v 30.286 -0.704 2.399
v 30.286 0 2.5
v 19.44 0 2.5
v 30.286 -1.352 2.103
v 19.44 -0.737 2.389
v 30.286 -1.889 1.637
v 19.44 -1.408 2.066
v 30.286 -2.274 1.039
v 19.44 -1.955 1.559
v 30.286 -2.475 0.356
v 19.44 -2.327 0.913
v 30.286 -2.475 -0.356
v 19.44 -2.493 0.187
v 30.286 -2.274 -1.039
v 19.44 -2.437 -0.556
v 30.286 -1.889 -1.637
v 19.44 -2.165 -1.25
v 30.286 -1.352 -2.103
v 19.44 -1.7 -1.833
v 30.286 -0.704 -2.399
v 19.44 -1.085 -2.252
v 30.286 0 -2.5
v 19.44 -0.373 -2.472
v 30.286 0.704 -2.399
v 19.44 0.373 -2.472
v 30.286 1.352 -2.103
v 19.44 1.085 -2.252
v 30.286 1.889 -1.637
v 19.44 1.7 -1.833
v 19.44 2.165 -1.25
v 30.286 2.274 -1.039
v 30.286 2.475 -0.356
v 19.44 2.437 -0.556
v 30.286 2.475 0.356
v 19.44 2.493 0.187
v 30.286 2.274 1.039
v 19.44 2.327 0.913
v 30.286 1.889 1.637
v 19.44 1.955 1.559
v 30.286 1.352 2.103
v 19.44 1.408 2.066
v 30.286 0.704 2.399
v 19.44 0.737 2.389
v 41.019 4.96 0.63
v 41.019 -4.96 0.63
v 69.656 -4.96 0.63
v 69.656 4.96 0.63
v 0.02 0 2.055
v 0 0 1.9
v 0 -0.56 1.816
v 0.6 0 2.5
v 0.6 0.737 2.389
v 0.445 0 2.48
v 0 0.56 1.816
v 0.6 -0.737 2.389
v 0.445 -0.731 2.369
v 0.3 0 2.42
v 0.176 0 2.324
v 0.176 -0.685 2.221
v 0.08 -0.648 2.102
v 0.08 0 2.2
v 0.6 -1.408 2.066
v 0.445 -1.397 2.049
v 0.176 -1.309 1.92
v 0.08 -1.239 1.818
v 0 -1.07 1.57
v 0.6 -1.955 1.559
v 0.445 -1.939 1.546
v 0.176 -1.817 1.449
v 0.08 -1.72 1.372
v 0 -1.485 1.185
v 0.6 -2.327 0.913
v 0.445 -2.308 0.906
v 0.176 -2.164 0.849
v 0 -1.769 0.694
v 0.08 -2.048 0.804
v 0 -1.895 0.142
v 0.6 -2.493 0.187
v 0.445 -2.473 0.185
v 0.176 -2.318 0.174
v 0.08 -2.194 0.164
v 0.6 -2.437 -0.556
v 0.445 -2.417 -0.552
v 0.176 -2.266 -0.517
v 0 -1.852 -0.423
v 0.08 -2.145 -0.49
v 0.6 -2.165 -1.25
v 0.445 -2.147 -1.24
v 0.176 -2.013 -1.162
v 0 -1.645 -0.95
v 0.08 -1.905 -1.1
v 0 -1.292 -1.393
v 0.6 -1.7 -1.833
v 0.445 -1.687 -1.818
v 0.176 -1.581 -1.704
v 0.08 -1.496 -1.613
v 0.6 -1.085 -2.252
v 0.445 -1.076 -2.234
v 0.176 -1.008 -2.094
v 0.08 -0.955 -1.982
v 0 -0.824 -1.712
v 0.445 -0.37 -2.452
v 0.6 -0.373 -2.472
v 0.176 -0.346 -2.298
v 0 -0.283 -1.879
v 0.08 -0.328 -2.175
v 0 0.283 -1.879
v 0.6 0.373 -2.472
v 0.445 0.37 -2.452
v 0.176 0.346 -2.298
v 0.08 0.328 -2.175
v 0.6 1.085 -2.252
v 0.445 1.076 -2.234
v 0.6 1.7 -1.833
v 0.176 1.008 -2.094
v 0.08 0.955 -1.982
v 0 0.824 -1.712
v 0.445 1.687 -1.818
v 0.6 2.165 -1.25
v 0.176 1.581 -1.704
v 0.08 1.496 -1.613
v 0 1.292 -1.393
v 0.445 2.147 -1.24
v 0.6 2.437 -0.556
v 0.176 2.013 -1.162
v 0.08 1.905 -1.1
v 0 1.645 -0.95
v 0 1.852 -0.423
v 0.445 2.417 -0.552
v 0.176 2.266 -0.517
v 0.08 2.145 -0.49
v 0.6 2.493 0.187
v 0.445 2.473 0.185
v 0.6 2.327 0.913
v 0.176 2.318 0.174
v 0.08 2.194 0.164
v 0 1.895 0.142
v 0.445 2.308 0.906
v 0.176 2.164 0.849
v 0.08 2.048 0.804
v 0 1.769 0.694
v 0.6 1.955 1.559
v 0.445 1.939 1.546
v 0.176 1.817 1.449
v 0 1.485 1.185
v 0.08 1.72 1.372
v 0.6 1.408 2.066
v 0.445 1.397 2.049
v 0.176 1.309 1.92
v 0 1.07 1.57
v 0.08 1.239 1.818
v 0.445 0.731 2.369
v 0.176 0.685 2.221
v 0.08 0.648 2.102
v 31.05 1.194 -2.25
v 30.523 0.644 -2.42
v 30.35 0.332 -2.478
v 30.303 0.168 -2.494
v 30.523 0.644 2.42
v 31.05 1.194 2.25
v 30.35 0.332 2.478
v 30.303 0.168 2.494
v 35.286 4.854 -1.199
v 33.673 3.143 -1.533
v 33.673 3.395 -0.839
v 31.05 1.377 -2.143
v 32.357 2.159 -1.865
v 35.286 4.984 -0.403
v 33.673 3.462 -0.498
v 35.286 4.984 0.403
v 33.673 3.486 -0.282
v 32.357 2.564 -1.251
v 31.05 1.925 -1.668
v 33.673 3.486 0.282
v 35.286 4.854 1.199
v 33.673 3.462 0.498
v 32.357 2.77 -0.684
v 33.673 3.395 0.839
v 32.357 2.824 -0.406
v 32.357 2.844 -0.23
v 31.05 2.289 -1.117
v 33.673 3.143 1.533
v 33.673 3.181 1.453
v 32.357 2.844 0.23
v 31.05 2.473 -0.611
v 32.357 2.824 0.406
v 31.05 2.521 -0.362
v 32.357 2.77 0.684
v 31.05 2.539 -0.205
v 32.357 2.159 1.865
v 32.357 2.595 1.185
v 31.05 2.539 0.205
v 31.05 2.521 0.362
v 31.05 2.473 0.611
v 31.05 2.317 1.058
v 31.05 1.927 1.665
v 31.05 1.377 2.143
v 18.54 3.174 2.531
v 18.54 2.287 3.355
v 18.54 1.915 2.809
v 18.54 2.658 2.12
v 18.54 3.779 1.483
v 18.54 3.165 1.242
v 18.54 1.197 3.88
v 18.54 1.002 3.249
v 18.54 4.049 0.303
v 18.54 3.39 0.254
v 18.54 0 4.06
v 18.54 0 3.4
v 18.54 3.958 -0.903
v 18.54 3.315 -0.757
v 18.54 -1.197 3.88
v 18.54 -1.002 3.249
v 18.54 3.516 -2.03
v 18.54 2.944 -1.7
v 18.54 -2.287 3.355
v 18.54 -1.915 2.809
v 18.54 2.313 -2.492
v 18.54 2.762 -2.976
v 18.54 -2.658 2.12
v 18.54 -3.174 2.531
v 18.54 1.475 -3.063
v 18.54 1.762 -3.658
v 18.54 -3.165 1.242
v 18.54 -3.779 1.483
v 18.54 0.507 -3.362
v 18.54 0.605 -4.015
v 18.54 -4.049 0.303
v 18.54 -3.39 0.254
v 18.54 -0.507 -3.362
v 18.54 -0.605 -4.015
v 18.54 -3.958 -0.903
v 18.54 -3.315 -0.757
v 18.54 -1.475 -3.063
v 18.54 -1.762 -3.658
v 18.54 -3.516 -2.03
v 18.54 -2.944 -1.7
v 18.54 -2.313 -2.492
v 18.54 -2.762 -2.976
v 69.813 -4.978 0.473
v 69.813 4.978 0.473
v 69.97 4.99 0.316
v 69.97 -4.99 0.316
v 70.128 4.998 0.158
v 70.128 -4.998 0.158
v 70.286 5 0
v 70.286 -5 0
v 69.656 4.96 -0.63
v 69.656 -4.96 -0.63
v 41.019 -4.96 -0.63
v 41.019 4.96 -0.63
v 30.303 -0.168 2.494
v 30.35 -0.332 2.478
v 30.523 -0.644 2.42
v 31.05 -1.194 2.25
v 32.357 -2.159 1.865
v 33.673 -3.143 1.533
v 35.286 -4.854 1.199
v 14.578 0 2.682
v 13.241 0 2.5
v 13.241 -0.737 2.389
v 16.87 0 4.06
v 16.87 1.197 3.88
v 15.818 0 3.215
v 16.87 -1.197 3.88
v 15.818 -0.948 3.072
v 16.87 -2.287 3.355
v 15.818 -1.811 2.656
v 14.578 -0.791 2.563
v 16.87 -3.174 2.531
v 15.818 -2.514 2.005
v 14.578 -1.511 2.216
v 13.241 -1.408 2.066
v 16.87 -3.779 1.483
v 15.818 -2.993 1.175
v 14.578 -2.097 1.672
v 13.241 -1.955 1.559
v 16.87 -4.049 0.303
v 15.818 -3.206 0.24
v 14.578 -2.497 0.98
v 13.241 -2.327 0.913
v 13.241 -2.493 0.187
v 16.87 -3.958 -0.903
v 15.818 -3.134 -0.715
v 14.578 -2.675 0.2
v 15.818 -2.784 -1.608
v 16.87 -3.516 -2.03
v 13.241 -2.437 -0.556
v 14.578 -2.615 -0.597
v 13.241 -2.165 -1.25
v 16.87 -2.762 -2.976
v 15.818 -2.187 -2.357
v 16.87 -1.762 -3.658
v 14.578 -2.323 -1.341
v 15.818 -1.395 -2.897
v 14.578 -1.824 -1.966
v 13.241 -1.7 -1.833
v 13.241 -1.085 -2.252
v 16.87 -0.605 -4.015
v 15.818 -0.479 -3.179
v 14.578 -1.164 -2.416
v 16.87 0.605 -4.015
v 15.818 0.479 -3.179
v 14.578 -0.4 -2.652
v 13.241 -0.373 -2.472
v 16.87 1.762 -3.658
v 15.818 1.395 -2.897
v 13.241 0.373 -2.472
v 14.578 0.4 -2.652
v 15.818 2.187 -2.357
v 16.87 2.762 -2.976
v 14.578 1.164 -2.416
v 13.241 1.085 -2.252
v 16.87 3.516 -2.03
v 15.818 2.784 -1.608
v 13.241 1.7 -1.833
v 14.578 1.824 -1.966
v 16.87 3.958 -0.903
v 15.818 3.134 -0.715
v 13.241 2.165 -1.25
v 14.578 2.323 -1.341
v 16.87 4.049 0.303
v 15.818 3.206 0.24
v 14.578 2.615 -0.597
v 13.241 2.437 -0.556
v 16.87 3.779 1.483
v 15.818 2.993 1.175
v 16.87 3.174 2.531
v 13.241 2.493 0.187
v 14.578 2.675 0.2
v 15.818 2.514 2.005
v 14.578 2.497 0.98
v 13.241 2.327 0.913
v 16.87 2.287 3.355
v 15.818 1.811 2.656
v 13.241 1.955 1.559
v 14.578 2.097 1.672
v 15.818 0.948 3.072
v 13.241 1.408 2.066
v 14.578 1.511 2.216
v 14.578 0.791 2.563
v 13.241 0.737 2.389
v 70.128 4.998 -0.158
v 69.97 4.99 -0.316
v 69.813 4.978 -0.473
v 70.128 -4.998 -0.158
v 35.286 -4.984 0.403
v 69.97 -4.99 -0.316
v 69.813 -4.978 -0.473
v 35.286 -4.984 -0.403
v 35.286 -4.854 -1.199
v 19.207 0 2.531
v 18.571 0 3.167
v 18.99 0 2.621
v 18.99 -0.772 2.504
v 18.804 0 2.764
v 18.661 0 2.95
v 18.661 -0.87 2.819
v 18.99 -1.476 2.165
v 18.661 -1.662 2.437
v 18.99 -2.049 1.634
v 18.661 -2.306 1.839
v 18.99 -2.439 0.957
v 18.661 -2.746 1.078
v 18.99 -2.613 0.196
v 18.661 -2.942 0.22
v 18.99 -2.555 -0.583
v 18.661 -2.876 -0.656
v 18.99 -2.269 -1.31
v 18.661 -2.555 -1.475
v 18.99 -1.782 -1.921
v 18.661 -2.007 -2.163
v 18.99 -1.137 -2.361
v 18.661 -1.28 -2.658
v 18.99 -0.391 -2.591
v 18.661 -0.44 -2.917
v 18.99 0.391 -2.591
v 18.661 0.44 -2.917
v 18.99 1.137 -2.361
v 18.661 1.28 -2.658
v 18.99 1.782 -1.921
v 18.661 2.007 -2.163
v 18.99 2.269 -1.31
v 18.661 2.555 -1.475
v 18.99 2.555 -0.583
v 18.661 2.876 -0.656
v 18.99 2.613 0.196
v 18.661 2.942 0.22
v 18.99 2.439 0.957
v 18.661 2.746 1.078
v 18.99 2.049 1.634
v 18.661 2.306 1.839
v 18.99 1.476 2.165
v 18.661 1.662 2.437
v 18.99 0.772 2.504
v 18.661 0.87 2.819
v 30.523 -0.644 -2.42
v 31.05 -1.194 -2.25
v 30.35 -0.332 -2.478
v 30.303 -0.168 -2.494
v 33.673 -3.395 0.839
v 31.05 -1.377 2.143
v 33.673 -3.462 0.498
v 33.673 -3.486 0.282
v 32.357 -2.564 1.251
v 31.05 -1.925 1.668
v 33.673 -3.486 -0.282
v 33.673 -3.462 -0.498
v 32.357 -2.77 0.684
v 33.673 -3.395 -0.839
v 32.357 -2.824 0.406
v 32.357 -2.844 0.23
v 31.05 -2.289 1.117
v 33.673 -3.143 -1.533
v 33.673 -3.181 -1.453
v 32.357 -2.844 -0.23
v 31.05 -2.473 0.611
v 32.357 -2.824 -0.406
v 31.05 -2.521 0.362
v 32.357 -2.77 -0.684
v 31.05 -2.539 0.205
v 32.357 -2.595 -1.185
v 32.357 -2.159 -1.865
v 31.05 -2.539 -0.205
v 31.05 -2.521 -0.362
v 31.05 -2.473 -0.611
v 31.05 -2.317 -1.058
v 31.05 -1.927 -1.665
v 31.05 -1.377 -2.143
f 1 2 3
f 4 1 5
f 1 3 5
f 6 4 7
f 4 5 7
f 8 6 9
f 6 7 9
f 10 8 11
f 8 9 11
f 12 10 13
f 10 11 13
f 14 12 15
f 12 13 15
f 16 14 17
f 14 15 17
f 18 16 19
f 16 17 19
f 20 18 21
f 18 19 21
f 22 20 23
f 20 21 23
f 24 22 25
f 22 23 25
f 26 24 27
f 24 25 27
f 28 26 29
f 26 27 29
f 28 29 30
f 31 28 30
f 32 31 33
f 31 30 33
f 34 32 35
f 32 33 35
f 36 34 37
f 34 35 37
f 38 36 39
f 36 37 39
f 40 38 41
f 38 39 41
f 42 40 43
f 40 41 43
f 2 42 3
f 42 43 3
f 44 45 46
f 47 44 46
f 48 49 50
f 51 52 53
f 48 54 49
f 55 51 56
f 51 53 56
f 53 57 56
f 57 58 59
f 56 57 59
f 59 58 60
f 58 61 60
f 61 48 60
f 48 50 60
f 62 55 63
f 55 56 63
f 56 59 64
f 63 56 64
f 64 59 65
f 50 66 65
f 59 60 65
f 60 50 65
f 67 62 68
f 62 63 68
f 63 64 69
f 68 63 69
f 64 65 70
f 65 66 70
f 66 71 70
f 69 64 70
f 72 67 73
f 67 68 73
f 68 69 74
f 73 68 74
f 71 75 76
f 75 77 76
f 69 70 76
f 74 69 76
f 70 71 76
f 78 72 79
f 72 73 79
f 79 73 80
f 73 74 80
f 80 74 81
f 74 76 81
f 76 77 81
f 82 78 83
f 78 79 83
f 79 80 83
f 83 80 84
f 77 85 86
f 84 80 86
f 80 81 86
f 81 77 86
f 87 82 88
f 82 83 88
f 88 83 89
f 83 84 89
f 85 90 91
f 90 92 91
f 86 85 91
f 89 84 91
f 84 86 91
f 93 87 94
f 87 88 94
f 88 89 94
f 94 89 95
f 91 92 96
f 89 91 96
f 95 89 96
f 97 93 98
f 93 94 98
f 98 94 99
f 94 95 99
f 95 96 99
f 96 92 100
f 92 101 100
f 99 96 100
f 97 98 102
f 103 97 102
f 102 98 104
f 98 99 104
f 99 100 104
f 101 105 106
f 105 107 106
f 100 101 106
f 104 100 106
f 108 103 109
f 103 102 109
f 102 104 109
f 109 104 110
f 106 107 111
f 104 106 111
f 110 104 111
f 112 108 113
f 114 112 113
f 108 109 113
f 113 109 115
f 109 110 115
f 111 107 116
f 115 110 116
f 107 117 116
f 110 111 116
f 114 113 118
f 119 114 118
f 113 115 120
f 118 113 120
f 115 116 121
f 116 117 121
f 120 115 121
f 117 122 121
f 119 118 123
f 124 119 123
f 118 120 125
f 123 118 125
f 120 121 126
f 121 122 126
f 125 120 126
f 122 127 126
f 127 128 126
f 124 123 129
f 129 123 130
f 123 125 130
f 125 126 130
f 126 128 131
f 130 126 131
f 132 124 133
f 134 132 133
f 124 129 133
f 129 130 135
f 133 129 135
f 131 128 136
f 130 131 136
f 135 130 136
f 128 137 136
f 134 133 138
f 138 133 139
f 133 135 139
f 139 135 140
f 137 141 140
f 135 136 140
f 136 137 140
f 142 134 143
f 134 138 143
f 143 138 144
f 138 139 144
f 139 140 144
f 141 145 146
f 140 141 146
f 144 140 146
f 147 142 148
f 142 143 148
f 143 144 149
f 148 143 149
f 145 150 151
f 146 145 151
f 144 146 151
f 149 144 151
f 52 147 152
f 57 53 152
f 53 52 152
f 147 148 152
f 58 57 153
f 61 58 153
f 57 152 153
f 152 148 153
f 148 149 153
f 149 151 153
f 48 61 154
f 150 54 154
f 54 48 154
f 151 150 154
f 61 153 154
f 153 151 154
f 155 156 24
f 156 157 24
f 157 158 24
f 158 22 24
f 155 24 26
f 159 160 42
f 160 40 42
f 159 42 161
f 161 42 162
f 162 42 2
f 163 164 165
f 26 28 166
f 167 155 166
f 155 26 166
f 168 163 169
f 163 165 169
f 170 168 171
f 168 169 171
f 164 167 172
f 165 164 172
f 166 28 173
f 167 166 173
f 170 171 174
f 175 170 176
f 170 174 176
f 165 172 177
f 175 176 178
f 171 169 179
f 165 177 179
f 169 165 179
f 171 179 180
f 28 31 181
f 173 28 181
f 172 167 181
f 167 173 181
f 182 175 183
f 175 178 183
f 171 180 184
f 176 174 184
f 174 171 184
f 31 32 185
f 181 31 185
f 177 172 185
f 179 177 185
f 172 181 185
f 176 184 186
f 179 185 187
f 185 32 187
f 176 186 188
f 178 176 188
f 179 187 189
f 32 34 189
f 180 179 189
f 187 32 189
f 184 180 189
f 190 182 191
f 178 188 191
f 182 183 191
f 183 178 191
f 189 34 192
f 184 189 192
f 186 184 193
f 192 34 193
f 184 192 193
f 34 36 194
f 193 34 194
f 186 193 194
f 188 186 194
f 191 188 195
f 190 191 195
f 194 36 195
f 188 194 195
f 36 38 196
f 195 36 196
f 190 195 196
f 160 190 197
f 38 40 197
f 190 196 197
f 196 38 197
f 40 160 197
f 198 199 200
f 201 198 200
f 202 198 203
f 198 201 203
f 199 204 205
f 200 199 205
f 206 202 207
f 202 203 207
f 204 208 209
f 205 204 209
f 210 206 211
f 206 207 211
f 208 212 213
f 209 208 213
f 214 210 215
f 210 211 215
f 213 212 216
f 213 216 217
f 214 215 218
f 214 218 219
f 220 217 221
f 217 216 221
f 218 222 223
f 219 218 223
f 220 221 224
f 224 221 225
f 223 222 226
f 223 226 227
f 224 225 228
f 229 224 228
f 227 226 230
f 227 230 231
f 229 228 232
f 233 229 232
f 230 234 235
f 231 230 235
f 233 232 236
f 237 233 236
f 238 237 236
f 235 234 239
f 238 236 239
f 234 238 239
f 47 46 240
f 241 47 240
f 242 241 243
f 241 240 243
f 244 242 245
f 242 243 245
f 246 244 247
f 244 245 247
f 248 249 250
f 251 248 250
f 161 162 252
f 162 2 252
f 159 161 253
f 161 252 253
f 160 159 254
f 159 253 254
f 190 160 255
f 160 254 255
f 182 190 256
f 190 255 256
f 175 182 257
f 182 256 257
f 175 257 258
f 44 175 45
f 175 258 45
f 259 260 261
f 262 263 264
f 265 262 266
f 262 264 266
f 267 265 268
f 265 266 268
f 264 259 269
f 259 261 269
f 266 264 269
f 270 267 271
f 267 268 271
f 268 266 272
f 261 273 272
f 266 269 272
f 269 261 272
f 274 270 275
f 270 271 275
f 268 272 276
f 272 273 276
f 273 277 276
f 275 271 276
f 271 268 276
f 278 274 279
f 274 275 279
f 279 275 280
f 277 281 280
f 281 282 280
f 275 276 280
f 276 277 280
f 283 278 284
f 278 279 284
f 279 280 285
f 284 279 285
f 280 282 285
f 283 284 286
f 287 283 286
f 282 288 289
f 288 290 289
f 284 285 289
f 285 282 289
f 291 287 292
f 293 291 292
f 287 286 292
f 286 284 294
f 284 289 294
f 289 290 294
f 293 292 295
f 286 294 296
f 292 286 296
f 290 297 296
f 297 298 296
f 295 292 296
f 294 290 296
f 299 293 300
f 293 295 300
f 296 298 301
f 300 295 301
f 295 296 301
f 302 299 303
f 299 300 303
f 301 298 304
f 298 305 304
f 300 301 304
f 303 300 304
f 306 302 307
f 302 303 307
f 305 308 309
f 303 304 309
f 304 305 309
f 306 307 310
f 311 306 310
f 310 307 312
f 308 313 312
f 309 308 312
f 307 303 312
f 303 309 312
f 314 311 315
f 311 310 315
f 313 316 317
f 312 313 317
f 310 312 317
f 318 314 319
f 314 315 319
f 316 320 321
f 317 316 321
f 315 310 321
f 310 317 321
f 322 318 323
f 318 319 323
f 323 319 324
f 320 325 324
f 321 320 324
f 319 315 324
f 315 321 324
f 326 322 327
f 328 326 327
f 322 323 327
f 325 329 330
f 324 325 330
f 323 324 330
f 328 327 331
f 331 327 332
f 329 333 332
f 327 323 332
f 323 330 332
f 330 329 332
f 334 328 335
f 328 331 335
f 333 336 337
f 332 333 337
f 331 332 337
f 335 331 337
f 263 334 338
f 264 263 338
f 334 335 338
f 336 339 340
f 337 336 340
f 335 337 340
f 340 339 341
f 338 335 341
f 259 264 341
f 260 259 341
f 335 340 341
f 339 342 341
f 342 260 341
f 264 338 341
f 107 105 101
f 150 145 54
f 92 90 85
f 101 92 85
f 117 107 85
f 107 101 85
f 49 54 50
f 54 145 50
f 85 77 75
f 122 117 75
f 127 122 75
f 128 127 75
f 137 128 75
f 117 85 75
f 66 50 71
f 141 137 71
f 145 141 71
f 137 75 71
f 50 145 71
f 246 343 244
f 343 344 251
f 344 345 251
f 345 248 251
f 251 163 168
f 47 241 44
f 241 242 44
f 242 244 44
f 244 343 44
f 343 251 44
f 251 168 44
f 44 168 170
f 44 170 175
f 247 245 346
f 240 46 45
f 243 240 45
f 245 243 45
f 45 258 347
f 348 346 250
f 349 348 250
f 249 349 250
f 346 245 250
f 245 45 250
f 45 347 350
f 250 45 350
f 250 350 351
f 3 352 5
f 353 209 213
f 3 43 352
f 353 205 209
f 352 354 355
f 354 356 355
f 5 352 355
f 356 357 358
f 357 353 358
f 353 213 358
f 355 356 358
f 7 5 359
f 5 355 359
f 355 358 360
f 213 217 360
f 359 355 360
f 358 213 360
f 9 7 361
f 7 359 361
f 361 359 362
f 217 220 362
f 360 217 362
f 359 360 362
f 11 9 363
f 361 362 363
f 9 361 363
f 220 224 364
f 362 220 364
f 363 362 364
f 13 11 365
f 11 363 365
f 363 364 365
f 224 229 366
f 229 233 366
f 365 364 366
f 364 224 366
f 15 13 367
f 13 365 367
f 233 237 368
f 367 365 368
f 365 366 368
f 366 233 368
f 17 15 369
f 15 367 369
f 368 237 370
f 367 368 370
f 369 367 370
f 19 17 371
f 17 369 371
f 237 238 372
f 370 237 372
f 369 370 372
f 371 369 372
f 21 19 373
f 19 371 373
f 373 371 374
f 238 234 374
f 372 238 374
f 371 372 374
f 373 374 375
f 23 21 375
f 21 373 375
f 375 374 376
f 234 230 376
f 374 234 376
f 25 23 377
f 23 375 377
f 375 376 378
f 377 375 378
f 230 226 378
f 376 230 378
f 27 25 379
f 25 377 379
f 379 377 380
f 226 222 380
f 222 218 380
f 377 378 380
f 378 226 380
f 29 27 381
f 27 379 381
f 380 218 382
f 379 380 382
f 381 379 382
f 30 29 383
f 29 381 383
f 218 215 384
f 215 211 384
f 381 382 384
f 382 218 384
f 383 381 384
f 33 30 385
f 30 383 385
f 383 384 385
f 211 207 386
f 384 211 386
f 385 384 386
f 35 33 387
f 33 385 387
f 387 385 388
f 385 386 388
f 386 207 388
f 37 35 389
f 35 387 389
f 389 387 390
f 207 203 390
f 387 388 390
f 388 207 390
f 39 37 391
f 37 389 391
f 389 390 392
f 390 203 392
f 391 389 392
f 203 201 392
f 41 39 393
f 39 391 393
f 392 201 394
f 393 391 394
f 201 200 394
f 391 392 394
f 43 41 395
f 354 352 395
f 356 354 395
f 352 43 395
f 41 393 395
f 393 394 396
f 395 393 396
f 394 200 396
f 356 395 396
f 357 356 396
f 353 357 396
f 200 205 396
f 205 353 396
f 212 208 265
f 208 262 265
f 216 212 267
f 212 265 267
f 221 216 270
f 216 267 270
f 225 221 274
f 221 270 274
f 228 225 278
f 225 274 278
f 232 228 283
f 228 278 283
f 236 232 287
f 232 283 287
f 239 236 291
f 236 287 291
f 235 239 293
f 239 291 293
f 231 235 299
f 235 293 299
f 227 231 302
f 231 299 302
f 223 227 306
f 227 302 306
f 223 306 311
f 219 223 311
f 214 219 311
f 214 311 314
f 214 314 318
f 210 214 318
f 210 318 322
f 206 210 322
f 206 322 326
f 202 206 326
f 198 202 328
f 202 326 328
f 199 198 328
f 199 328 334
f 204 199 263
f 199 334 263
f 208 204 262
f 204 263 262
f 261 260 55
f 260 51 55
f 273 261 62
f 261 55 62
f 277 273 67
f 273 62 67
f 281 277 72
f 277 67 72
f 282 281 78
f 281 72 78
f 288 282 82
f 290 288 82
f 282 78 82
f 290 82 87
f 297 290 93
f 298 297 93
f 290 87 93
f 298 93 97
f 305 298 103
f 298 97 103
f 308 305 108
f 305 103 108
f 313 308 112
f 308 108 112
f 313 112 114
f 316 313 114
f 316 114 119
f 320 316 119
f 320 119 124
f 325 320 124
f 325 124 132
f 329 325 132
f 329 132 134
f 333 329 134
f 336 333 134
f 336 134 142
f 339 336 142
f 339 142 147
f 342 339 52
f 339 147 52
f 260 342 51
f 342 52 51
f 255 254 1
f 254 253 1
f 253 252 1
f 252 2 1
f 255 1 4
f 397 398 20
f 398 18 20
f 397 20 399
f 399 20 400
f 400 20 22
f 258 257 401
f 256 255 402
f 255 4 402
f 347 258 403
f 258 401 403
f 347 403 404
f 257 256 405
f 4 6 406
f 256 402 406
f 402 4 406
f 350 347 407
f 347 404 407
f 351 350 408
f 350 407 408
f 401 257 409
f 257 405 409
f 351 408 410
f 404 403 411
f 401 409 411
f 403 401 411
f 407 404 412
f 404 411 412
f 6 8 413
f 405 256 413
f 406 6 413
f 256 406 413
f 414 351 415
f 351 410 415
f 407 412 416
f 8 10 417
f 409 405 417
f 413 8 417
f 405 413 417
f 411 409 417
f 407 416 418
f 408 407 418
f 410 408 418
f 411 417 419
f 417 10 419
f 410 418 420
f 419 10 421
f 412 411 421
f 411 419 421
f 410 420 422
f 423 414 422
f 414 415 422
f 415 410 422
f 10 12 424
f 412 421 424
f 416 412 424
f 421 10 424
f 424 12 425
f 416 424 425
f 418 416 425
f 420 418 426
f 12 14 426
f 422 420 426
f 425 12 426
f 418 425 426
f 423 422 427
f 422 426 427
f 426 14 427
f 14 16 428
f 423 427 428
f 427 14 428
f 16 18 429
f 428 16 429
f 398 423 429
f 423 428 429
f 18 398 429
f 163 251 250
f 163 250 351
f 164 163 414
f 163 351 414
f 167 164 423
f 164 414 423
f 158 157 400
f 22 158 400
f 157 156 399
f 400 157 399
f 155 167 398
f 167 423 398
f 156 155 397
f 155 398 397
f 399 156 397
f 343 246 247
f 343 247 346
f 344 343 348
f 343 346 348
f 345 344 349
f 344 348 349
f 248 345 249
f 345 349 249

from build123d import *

# Parameters (mm, degrees)
F3_DEPTH = 25
F4_DEPTH = 25


with BuildPart() as f1:
    # F0 (on Front) → F1 (revolve)
    with BuildSketch(Plane.XZ):
        with BuildLine():
            Line((0, 1.9), (0, 0))
            Line((0, 0), (70.28609, 0))
            Line((70.28609, 0), (70.28609, 5))
            Line((70.28609, 5), (35.28609, 5))
            ThreePointArc((35.28609, 5), (33.081175, 3.15983), (30.28609, 2.5))
            Line((30.28609, 2.5), (19.44, 2.5))
            ThreePointArc((19.44, 2.5), (18.803604, 2.763604), (18.54, 3.4))
            Line((18.54, 3.4), (18.54, 4.06))
            Line((18.54, 4.06), (16.87, 4.06))
            ThreePointArc((16.87, 4.06), (15.216288, 2.906526), (13.241447, 2.5))
            Line((13.241447, 2.5), (0.6, 2.5))
            ThreePointArc((0.6, 2.5), (0.175736, 2.324264), (0, 1.9))
        make_face()
    revolve(axis=Axis((35.143045, 0, 0), (1, 0, 0)))

    # F2 (on Front) → F3 (cut)
    with BuildSketch(Plane.XZ):
        with BuildLine():
            ThreePointArc((30.28609, 2.5), (35.579623, 1.146564), (41.018965, 0.63))
            Line((41.018965, 0.63), (69.65609, 0.63))
            Line((69.65609, 0.63), (70.28609, 0))
            Line((70.28609, 0), (73.746532, 14.08634))
            Line((73.746532, 14.08634), (30.28609, 14.08634))
            Line((30.28609, 14.08634), (30.28609, 2.5))
        make_face()
        with BuildLine():
            Line((73.746532, -14.08634), (70.28609, 0))
            Line((70.28609, 0), (69.65609, -0.63))
            Line((69.65609, -0.63), (41.018965, -0.63))
            ThreePointArc((41.018965, -0.63), (35.579623, -1.146564), (30.28609, -2.5))
            Line((30.28609, -2.5), (30.28609, -14.08634))
            Line((30.28609, -14.08634), (73.746532, -14.08634))
        make_face()
    extrude(amount=-F3_DEPTH, mode=Mode.SUBTRACT)

    # F2 (on Front) → F4 (cut)
    with BuildSketch(Plane.XZ):
        with BuildLine():
            ThreePointArc((30.28609, 2.5), (35.579623, 1.146564), (41.018965, 0.63))
            Line((41.018965, 0.63), (69.65609, 0.63))
            Line((69.65609, 0.63), (70.28609, 0))
            Line((70.28609, 0), (73.746532, 14.08634))
            Line((73.746532, 14.08634), (30.28609, 14.08634))
            Line((30.28609, 14.08634), (30.28609, 2.5))
        make_face()
        with BuildLine():
            Line((73.746532, -14.08634), (70.28609, 0))
            Line((70.28609, 0), (69.65609, -0.63))
            Line((69.65609, -0.63), (41.018965, -0.63))
            ThreePointArc((41.018965, -0.63), (35.579623, -1.146564), (30.28609, -2.5))
            Line((30.28609, -2.5), (30.28609, -14.08634))
            Line((30.28609, -14.08634), (73.746532, -14.08634))
        make_face()
    extrude(amount=F4_DEPTH, mode=Mode.SUBTRACT)


solid = f1.part
